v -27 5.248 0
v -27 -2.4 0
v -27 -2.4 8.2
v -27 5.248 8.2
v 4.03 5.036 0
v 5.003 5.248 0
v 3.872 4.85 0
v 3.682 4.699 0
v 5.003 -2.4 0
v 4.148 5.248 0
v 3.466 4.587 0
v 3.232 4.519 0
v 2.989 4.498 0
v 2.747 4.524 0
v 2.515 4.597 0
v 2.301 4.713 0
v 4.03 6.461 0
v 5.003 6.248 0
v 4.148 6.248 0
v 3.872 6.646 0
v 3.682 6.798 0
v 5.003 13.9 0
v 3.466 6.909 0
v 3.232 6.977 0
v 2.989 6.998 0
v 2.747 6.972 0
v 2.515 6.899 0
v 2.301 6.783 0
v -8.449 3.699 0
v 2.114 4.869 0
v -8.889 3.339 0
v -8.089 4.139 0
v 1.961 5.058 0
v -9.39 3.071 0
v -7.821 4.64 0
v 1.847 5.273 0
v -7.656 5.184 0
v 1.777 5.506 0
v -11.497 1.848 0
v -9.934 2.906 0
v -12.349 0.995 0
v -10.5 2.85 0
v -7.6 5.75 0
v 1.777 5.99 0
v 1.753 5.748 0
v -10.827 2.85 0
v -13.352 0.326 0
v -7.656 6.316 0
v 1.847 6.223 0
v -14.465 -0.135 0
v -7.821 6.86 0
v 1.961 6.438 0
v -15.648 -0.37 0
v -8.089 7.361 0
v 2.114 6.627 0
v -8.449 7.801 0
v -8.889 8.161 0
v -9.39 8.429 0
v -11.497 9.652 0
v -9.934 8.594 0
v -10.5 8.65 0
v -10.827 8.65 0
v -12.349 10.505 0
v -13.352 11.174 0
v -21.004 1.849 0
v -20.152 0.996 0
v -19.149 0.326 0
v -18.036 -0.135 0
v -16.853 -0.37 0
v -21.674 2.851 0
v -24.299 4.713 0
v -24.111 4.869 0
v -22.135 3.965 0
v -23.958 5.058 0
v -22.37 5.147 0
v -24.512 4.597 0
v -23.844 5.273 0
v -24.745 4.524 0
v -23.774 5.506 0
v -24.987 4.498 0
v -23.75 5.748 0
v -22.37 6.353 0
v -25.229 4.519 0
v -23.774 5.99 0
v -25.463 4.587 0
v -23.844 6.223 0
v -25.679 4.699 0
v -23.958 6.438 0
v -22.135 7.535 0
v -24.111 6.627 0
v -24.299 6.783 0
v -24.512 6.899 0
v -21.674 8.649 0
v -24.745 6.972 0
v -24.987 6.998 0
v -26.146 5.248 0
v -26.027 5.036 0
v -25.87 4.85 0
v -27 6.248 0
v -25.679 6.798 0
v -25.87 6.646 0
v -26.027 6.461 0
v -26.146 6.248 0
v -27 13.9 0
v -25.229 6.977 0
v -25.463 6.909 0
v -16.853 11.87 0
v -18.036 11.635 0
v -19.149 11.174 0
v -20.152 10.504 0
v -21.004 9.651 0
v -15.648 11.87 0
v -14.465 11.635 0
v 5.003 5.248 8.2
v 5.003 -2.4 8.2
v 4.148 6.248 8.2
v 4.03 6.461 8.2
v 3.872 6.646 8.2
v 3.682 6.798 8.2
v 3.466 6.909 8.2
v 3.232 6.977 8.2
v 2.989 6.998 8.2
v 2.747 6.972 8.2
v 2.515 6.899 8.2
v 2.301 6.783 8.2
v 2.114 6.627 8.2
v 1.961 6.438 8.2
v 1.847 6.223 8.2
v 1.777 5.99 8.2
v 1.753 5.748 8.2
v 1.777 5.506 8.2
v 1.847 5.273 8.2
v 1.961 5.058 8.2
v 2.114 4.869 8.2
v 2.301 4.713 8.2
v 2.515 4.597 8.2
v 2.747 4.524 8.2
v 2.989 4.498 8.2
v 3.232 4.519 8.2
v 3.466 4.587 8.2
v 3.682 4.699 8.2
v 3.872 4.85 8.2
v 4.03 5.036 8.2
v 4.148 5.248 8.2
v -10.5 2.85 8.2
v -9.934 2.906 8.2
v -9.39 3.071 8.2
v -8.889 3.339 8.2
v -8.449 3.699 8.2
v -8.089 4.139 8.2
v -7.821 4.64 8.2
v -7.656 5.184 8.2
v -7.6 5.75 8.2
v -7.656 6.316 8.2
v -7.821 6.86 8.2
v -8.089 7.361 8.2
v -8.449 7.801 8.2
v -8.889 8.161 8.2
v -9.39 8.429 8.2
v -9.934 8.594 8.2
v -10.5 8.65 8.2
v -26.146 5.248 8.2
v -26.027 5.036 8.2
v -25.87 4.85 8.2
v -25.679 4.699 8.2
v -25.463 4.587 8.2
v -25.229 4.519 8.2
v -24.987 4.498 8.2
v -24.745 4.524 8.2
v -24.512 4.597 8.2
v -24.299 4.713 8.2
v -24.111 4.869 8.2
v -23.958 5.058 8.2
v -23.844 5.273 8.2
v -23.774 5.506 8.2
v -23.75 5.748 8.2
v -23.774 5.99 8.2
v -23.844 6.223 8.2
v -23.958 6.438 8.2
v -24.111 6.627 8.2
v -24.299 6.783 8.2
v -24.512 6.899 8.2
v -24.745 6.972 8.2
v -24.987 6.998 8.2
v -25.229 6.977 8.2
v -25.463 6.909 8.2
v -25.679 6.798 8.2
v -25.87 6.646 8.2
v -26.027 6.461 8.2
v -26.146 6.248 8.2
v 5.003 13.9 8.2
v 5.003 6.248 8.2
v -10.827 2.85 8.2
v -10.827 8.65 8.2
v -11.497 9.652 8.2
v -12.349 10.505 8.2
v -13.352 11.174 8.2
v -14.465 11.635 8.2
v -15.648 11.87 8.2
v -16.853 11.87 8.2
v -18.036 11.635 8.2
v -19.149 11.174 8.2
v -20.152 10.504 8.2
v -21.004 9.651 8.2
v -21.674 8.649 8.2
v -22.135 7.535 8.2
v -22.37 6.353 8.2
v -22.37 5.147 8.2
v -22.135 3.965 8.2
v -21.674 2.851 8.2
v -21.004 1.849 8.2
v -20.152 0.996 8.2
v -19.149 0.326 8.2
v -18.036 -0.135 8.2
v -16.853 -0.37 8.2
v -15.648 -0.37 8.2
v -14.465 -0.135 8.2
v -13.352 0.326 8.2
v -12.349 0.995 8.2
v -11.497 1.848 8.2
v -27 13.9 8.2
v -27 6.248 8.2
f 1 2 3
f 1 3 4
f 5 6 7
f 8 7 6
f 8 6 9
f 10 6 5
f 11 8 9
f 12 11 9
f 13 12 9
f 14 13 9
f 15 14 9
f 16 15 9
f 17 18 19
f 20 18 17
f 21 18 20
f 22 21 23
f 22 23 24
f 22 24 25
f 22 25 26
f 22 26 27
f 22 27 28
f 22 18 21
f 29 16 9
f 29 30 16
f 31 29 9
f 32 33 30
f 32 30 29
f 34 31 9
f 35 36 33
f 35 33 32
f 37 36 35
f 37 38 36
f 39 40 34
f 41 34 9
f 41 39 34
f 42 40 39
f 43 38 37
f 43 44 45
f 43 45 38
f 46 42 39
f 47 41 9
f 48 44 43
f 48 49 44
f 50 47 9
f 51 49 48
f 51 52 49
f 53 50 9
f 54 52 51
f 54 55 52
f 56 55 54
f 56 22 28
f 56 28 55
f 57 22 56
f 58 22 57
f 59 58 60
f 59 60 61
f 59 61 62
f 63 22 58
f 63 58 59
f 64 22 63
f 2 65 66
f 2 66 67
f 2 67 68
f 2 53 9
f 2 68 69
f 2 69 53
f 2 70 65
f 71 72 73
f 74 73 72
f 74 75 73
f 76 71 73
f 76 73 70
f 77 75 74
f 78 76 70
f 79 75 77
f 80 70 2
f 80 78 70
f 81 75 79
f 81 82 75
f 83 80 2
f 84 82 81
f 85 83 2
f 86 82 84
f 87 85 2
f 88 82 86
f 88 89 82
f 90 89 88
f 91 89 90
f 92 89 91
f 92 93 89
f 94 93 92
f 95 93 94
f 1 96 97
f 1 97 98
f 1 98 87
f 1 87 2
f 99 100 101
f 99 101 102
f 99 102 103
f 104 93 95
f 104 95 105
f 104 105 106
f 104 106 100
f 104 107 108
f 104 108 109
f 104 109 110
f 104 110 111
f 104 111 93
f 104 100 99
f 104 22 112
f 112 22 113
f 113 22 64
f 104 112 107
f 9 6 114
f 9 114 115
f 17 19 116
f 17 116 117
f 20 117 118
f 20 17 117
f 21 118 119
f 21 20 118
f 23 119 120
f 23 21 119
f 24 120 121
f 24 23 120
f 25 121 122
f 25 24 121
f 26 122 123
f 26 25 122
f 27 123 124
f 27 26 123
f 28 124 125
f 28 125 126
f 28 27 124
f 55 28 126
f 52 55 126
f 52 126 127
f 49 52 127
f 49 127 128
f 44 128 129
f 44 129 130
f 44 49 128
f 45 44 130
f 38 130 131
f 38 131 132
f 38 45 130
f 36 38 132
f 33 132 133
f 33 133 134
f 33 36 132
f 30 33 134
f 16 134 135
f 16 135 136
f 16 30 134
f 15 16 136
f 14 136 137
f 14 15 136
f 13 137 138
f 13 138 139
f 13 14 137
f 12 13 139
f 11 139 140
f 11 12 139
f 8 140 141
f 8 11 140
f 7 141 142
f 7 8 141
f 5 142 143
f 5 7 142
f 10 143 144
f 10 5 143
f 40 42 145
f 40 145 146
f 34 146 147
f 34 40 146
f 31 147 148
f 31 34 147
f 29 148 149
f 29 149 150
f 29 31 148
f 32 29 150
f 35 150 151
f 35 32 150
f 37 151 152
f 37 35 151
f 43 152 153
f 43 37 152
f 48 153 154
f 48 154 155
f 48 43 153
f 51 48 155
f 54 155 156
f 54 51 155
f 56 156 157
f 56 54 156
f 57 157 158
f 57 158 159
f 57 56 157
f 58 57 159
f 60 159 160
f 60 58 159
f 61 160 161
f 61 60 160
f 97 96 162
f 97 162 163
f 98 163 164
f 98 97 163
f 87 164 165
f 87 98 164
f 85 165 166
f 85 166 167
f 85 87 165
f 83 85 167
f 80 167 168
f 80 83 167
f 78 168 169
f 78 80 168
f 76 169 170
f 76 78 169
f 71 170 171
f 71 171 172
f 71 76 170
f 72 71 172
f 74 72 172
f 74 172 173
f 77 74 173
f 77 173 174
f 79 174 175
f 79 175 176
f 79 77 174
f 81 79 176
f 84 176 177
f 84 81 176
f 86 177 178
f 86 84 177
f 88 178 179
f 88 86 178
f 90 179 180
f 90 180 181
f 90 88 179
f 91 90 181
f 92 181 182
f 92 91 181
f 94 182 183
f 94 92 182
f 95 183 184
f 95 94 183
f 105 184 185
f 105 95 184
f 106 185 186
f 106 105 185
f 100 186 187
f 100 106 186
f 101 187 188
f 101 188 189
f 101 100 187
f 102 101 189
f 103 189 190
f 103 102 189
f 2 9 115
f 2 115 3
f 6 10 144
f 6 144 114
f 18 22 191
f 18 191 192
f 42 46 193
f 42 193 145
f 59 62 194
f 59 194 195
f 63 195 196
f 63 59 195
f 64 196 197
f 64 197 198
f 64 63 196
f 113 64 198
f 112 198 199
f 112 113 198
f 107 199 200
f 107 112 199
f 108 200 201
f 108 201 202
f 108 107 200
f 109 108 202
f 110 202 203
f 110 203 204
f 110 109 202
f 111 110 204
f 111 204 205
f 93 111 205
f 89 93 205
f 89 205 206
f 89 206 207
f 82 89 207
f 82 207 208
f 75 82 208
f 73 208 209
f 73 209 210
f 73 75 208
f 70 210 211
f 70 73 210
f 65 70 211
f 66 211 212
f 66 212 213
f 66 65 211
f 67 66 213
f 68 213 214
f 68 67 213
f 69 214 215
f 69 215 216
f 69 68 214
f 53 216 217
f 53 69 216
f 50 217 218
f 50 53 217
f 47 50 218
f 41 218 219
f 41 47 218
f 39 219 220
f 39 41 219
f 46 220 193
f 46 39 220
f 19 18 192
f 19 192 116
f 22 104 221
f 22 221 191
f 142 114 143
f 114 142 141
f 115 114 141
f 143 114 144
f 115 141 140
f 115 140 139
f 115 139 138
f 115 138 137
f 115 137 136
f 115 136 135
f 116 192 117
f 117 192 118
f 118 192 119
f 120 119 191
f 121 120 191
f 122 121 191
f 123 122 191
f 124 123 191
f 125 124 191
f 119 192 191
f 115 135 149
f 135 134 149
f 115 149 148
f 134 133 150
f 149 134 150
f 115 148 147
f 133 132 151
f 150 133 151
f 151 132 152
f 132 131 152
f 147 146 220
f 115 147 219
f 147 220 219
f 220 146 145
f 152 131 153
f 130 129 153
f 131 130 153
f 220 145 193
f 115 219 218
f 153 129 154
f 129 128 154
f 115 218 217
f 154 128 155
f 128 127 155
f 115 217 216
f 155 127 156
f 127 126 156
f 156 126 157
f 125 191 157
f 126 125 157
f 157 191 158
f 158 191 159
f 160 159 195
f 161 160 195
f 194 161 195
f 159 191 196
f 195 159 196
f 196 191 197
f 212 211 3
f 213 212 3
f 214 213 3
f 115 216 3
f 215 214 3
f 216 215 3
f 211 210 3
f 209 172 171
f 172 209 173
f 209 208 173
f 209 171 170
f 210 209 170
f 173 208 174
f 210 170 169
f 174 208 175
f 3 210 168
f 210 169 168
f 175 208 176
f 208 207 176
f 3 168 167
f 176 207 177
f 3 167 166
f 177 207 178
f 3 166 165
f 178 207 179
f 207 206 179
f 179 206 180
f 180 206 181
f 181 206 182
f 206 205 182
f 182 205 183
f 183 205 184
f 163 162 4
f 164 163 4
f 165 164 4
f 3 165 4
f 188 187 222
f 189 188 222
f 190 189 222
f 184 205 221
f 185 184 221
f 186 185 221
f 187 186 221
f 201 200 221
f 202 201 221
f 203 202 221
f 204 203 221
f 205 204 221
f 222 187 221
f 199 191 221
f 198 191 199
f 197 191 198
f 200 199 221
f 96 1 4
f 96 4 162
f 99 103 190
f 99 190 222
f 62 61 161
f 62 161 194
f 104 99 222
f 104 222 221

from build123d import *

# Parameters (mm, degrees)
BOSS_EXTRUDE1_DEPTH = 8.2


with BuildPart() as part:
    # Sketch1 → Boss-Extrude1 (new body)
    with BuildSketch(Plane.XY):
        with BuildLine():
            Line((5.002809822, -2.4), (-27, -2.4))
            Line((-27, -2.4), (-27, 5.24803322))
            Line((-27, 5.24803322), (-26.145643924, 5.24803322))
            ThreePointArc((-26.145643924, 5.24803322), (-23.75, 5.74803322), (-26.145643924, 6.24803322))
            Line((-26.145643924, 6.24803322), (-27, 6.24803322))
            Line((-27, 6.24803322), (-27, 13.9))
            Line((-27, 13.9), (5.002809822, 13.9))
            Line((5.002809822, 13.9), (5.002809822, 6.24803322))
            Line((5.002809822, 6.24803322), (4.148453745, 6.24803322))
            ThreePointArc((4.148453745, 6.24803322), (1.752809822, 5.74803322), (4.148453745, 5.24803322))
            Line((4.148453745, 5.24803322), (5.002809822, 5.24803322))
            Line((5.002809822, 5.24803322), (5.002809822, -2.4))
        make_face()
        with BuildLine():
            Line((-10.5, 8.65), (-10.826670764, 8.65))
            ThreePointArc((-10.826670764, 8.65), (-22.4, 5.75), (-10.826670764, 2.85))
            Line((-10.826670764, 2.85), (-10.5, 2.85))
            ThreePointArc((-10.5, 2.85), (-7.6, 5.75), (-10.5, 8.65))
        make_face(mode=Mode.SUBTRACT)
    extrude(amount=BOSS_EXTRUDE1_DEPTH)


solid = part.part
